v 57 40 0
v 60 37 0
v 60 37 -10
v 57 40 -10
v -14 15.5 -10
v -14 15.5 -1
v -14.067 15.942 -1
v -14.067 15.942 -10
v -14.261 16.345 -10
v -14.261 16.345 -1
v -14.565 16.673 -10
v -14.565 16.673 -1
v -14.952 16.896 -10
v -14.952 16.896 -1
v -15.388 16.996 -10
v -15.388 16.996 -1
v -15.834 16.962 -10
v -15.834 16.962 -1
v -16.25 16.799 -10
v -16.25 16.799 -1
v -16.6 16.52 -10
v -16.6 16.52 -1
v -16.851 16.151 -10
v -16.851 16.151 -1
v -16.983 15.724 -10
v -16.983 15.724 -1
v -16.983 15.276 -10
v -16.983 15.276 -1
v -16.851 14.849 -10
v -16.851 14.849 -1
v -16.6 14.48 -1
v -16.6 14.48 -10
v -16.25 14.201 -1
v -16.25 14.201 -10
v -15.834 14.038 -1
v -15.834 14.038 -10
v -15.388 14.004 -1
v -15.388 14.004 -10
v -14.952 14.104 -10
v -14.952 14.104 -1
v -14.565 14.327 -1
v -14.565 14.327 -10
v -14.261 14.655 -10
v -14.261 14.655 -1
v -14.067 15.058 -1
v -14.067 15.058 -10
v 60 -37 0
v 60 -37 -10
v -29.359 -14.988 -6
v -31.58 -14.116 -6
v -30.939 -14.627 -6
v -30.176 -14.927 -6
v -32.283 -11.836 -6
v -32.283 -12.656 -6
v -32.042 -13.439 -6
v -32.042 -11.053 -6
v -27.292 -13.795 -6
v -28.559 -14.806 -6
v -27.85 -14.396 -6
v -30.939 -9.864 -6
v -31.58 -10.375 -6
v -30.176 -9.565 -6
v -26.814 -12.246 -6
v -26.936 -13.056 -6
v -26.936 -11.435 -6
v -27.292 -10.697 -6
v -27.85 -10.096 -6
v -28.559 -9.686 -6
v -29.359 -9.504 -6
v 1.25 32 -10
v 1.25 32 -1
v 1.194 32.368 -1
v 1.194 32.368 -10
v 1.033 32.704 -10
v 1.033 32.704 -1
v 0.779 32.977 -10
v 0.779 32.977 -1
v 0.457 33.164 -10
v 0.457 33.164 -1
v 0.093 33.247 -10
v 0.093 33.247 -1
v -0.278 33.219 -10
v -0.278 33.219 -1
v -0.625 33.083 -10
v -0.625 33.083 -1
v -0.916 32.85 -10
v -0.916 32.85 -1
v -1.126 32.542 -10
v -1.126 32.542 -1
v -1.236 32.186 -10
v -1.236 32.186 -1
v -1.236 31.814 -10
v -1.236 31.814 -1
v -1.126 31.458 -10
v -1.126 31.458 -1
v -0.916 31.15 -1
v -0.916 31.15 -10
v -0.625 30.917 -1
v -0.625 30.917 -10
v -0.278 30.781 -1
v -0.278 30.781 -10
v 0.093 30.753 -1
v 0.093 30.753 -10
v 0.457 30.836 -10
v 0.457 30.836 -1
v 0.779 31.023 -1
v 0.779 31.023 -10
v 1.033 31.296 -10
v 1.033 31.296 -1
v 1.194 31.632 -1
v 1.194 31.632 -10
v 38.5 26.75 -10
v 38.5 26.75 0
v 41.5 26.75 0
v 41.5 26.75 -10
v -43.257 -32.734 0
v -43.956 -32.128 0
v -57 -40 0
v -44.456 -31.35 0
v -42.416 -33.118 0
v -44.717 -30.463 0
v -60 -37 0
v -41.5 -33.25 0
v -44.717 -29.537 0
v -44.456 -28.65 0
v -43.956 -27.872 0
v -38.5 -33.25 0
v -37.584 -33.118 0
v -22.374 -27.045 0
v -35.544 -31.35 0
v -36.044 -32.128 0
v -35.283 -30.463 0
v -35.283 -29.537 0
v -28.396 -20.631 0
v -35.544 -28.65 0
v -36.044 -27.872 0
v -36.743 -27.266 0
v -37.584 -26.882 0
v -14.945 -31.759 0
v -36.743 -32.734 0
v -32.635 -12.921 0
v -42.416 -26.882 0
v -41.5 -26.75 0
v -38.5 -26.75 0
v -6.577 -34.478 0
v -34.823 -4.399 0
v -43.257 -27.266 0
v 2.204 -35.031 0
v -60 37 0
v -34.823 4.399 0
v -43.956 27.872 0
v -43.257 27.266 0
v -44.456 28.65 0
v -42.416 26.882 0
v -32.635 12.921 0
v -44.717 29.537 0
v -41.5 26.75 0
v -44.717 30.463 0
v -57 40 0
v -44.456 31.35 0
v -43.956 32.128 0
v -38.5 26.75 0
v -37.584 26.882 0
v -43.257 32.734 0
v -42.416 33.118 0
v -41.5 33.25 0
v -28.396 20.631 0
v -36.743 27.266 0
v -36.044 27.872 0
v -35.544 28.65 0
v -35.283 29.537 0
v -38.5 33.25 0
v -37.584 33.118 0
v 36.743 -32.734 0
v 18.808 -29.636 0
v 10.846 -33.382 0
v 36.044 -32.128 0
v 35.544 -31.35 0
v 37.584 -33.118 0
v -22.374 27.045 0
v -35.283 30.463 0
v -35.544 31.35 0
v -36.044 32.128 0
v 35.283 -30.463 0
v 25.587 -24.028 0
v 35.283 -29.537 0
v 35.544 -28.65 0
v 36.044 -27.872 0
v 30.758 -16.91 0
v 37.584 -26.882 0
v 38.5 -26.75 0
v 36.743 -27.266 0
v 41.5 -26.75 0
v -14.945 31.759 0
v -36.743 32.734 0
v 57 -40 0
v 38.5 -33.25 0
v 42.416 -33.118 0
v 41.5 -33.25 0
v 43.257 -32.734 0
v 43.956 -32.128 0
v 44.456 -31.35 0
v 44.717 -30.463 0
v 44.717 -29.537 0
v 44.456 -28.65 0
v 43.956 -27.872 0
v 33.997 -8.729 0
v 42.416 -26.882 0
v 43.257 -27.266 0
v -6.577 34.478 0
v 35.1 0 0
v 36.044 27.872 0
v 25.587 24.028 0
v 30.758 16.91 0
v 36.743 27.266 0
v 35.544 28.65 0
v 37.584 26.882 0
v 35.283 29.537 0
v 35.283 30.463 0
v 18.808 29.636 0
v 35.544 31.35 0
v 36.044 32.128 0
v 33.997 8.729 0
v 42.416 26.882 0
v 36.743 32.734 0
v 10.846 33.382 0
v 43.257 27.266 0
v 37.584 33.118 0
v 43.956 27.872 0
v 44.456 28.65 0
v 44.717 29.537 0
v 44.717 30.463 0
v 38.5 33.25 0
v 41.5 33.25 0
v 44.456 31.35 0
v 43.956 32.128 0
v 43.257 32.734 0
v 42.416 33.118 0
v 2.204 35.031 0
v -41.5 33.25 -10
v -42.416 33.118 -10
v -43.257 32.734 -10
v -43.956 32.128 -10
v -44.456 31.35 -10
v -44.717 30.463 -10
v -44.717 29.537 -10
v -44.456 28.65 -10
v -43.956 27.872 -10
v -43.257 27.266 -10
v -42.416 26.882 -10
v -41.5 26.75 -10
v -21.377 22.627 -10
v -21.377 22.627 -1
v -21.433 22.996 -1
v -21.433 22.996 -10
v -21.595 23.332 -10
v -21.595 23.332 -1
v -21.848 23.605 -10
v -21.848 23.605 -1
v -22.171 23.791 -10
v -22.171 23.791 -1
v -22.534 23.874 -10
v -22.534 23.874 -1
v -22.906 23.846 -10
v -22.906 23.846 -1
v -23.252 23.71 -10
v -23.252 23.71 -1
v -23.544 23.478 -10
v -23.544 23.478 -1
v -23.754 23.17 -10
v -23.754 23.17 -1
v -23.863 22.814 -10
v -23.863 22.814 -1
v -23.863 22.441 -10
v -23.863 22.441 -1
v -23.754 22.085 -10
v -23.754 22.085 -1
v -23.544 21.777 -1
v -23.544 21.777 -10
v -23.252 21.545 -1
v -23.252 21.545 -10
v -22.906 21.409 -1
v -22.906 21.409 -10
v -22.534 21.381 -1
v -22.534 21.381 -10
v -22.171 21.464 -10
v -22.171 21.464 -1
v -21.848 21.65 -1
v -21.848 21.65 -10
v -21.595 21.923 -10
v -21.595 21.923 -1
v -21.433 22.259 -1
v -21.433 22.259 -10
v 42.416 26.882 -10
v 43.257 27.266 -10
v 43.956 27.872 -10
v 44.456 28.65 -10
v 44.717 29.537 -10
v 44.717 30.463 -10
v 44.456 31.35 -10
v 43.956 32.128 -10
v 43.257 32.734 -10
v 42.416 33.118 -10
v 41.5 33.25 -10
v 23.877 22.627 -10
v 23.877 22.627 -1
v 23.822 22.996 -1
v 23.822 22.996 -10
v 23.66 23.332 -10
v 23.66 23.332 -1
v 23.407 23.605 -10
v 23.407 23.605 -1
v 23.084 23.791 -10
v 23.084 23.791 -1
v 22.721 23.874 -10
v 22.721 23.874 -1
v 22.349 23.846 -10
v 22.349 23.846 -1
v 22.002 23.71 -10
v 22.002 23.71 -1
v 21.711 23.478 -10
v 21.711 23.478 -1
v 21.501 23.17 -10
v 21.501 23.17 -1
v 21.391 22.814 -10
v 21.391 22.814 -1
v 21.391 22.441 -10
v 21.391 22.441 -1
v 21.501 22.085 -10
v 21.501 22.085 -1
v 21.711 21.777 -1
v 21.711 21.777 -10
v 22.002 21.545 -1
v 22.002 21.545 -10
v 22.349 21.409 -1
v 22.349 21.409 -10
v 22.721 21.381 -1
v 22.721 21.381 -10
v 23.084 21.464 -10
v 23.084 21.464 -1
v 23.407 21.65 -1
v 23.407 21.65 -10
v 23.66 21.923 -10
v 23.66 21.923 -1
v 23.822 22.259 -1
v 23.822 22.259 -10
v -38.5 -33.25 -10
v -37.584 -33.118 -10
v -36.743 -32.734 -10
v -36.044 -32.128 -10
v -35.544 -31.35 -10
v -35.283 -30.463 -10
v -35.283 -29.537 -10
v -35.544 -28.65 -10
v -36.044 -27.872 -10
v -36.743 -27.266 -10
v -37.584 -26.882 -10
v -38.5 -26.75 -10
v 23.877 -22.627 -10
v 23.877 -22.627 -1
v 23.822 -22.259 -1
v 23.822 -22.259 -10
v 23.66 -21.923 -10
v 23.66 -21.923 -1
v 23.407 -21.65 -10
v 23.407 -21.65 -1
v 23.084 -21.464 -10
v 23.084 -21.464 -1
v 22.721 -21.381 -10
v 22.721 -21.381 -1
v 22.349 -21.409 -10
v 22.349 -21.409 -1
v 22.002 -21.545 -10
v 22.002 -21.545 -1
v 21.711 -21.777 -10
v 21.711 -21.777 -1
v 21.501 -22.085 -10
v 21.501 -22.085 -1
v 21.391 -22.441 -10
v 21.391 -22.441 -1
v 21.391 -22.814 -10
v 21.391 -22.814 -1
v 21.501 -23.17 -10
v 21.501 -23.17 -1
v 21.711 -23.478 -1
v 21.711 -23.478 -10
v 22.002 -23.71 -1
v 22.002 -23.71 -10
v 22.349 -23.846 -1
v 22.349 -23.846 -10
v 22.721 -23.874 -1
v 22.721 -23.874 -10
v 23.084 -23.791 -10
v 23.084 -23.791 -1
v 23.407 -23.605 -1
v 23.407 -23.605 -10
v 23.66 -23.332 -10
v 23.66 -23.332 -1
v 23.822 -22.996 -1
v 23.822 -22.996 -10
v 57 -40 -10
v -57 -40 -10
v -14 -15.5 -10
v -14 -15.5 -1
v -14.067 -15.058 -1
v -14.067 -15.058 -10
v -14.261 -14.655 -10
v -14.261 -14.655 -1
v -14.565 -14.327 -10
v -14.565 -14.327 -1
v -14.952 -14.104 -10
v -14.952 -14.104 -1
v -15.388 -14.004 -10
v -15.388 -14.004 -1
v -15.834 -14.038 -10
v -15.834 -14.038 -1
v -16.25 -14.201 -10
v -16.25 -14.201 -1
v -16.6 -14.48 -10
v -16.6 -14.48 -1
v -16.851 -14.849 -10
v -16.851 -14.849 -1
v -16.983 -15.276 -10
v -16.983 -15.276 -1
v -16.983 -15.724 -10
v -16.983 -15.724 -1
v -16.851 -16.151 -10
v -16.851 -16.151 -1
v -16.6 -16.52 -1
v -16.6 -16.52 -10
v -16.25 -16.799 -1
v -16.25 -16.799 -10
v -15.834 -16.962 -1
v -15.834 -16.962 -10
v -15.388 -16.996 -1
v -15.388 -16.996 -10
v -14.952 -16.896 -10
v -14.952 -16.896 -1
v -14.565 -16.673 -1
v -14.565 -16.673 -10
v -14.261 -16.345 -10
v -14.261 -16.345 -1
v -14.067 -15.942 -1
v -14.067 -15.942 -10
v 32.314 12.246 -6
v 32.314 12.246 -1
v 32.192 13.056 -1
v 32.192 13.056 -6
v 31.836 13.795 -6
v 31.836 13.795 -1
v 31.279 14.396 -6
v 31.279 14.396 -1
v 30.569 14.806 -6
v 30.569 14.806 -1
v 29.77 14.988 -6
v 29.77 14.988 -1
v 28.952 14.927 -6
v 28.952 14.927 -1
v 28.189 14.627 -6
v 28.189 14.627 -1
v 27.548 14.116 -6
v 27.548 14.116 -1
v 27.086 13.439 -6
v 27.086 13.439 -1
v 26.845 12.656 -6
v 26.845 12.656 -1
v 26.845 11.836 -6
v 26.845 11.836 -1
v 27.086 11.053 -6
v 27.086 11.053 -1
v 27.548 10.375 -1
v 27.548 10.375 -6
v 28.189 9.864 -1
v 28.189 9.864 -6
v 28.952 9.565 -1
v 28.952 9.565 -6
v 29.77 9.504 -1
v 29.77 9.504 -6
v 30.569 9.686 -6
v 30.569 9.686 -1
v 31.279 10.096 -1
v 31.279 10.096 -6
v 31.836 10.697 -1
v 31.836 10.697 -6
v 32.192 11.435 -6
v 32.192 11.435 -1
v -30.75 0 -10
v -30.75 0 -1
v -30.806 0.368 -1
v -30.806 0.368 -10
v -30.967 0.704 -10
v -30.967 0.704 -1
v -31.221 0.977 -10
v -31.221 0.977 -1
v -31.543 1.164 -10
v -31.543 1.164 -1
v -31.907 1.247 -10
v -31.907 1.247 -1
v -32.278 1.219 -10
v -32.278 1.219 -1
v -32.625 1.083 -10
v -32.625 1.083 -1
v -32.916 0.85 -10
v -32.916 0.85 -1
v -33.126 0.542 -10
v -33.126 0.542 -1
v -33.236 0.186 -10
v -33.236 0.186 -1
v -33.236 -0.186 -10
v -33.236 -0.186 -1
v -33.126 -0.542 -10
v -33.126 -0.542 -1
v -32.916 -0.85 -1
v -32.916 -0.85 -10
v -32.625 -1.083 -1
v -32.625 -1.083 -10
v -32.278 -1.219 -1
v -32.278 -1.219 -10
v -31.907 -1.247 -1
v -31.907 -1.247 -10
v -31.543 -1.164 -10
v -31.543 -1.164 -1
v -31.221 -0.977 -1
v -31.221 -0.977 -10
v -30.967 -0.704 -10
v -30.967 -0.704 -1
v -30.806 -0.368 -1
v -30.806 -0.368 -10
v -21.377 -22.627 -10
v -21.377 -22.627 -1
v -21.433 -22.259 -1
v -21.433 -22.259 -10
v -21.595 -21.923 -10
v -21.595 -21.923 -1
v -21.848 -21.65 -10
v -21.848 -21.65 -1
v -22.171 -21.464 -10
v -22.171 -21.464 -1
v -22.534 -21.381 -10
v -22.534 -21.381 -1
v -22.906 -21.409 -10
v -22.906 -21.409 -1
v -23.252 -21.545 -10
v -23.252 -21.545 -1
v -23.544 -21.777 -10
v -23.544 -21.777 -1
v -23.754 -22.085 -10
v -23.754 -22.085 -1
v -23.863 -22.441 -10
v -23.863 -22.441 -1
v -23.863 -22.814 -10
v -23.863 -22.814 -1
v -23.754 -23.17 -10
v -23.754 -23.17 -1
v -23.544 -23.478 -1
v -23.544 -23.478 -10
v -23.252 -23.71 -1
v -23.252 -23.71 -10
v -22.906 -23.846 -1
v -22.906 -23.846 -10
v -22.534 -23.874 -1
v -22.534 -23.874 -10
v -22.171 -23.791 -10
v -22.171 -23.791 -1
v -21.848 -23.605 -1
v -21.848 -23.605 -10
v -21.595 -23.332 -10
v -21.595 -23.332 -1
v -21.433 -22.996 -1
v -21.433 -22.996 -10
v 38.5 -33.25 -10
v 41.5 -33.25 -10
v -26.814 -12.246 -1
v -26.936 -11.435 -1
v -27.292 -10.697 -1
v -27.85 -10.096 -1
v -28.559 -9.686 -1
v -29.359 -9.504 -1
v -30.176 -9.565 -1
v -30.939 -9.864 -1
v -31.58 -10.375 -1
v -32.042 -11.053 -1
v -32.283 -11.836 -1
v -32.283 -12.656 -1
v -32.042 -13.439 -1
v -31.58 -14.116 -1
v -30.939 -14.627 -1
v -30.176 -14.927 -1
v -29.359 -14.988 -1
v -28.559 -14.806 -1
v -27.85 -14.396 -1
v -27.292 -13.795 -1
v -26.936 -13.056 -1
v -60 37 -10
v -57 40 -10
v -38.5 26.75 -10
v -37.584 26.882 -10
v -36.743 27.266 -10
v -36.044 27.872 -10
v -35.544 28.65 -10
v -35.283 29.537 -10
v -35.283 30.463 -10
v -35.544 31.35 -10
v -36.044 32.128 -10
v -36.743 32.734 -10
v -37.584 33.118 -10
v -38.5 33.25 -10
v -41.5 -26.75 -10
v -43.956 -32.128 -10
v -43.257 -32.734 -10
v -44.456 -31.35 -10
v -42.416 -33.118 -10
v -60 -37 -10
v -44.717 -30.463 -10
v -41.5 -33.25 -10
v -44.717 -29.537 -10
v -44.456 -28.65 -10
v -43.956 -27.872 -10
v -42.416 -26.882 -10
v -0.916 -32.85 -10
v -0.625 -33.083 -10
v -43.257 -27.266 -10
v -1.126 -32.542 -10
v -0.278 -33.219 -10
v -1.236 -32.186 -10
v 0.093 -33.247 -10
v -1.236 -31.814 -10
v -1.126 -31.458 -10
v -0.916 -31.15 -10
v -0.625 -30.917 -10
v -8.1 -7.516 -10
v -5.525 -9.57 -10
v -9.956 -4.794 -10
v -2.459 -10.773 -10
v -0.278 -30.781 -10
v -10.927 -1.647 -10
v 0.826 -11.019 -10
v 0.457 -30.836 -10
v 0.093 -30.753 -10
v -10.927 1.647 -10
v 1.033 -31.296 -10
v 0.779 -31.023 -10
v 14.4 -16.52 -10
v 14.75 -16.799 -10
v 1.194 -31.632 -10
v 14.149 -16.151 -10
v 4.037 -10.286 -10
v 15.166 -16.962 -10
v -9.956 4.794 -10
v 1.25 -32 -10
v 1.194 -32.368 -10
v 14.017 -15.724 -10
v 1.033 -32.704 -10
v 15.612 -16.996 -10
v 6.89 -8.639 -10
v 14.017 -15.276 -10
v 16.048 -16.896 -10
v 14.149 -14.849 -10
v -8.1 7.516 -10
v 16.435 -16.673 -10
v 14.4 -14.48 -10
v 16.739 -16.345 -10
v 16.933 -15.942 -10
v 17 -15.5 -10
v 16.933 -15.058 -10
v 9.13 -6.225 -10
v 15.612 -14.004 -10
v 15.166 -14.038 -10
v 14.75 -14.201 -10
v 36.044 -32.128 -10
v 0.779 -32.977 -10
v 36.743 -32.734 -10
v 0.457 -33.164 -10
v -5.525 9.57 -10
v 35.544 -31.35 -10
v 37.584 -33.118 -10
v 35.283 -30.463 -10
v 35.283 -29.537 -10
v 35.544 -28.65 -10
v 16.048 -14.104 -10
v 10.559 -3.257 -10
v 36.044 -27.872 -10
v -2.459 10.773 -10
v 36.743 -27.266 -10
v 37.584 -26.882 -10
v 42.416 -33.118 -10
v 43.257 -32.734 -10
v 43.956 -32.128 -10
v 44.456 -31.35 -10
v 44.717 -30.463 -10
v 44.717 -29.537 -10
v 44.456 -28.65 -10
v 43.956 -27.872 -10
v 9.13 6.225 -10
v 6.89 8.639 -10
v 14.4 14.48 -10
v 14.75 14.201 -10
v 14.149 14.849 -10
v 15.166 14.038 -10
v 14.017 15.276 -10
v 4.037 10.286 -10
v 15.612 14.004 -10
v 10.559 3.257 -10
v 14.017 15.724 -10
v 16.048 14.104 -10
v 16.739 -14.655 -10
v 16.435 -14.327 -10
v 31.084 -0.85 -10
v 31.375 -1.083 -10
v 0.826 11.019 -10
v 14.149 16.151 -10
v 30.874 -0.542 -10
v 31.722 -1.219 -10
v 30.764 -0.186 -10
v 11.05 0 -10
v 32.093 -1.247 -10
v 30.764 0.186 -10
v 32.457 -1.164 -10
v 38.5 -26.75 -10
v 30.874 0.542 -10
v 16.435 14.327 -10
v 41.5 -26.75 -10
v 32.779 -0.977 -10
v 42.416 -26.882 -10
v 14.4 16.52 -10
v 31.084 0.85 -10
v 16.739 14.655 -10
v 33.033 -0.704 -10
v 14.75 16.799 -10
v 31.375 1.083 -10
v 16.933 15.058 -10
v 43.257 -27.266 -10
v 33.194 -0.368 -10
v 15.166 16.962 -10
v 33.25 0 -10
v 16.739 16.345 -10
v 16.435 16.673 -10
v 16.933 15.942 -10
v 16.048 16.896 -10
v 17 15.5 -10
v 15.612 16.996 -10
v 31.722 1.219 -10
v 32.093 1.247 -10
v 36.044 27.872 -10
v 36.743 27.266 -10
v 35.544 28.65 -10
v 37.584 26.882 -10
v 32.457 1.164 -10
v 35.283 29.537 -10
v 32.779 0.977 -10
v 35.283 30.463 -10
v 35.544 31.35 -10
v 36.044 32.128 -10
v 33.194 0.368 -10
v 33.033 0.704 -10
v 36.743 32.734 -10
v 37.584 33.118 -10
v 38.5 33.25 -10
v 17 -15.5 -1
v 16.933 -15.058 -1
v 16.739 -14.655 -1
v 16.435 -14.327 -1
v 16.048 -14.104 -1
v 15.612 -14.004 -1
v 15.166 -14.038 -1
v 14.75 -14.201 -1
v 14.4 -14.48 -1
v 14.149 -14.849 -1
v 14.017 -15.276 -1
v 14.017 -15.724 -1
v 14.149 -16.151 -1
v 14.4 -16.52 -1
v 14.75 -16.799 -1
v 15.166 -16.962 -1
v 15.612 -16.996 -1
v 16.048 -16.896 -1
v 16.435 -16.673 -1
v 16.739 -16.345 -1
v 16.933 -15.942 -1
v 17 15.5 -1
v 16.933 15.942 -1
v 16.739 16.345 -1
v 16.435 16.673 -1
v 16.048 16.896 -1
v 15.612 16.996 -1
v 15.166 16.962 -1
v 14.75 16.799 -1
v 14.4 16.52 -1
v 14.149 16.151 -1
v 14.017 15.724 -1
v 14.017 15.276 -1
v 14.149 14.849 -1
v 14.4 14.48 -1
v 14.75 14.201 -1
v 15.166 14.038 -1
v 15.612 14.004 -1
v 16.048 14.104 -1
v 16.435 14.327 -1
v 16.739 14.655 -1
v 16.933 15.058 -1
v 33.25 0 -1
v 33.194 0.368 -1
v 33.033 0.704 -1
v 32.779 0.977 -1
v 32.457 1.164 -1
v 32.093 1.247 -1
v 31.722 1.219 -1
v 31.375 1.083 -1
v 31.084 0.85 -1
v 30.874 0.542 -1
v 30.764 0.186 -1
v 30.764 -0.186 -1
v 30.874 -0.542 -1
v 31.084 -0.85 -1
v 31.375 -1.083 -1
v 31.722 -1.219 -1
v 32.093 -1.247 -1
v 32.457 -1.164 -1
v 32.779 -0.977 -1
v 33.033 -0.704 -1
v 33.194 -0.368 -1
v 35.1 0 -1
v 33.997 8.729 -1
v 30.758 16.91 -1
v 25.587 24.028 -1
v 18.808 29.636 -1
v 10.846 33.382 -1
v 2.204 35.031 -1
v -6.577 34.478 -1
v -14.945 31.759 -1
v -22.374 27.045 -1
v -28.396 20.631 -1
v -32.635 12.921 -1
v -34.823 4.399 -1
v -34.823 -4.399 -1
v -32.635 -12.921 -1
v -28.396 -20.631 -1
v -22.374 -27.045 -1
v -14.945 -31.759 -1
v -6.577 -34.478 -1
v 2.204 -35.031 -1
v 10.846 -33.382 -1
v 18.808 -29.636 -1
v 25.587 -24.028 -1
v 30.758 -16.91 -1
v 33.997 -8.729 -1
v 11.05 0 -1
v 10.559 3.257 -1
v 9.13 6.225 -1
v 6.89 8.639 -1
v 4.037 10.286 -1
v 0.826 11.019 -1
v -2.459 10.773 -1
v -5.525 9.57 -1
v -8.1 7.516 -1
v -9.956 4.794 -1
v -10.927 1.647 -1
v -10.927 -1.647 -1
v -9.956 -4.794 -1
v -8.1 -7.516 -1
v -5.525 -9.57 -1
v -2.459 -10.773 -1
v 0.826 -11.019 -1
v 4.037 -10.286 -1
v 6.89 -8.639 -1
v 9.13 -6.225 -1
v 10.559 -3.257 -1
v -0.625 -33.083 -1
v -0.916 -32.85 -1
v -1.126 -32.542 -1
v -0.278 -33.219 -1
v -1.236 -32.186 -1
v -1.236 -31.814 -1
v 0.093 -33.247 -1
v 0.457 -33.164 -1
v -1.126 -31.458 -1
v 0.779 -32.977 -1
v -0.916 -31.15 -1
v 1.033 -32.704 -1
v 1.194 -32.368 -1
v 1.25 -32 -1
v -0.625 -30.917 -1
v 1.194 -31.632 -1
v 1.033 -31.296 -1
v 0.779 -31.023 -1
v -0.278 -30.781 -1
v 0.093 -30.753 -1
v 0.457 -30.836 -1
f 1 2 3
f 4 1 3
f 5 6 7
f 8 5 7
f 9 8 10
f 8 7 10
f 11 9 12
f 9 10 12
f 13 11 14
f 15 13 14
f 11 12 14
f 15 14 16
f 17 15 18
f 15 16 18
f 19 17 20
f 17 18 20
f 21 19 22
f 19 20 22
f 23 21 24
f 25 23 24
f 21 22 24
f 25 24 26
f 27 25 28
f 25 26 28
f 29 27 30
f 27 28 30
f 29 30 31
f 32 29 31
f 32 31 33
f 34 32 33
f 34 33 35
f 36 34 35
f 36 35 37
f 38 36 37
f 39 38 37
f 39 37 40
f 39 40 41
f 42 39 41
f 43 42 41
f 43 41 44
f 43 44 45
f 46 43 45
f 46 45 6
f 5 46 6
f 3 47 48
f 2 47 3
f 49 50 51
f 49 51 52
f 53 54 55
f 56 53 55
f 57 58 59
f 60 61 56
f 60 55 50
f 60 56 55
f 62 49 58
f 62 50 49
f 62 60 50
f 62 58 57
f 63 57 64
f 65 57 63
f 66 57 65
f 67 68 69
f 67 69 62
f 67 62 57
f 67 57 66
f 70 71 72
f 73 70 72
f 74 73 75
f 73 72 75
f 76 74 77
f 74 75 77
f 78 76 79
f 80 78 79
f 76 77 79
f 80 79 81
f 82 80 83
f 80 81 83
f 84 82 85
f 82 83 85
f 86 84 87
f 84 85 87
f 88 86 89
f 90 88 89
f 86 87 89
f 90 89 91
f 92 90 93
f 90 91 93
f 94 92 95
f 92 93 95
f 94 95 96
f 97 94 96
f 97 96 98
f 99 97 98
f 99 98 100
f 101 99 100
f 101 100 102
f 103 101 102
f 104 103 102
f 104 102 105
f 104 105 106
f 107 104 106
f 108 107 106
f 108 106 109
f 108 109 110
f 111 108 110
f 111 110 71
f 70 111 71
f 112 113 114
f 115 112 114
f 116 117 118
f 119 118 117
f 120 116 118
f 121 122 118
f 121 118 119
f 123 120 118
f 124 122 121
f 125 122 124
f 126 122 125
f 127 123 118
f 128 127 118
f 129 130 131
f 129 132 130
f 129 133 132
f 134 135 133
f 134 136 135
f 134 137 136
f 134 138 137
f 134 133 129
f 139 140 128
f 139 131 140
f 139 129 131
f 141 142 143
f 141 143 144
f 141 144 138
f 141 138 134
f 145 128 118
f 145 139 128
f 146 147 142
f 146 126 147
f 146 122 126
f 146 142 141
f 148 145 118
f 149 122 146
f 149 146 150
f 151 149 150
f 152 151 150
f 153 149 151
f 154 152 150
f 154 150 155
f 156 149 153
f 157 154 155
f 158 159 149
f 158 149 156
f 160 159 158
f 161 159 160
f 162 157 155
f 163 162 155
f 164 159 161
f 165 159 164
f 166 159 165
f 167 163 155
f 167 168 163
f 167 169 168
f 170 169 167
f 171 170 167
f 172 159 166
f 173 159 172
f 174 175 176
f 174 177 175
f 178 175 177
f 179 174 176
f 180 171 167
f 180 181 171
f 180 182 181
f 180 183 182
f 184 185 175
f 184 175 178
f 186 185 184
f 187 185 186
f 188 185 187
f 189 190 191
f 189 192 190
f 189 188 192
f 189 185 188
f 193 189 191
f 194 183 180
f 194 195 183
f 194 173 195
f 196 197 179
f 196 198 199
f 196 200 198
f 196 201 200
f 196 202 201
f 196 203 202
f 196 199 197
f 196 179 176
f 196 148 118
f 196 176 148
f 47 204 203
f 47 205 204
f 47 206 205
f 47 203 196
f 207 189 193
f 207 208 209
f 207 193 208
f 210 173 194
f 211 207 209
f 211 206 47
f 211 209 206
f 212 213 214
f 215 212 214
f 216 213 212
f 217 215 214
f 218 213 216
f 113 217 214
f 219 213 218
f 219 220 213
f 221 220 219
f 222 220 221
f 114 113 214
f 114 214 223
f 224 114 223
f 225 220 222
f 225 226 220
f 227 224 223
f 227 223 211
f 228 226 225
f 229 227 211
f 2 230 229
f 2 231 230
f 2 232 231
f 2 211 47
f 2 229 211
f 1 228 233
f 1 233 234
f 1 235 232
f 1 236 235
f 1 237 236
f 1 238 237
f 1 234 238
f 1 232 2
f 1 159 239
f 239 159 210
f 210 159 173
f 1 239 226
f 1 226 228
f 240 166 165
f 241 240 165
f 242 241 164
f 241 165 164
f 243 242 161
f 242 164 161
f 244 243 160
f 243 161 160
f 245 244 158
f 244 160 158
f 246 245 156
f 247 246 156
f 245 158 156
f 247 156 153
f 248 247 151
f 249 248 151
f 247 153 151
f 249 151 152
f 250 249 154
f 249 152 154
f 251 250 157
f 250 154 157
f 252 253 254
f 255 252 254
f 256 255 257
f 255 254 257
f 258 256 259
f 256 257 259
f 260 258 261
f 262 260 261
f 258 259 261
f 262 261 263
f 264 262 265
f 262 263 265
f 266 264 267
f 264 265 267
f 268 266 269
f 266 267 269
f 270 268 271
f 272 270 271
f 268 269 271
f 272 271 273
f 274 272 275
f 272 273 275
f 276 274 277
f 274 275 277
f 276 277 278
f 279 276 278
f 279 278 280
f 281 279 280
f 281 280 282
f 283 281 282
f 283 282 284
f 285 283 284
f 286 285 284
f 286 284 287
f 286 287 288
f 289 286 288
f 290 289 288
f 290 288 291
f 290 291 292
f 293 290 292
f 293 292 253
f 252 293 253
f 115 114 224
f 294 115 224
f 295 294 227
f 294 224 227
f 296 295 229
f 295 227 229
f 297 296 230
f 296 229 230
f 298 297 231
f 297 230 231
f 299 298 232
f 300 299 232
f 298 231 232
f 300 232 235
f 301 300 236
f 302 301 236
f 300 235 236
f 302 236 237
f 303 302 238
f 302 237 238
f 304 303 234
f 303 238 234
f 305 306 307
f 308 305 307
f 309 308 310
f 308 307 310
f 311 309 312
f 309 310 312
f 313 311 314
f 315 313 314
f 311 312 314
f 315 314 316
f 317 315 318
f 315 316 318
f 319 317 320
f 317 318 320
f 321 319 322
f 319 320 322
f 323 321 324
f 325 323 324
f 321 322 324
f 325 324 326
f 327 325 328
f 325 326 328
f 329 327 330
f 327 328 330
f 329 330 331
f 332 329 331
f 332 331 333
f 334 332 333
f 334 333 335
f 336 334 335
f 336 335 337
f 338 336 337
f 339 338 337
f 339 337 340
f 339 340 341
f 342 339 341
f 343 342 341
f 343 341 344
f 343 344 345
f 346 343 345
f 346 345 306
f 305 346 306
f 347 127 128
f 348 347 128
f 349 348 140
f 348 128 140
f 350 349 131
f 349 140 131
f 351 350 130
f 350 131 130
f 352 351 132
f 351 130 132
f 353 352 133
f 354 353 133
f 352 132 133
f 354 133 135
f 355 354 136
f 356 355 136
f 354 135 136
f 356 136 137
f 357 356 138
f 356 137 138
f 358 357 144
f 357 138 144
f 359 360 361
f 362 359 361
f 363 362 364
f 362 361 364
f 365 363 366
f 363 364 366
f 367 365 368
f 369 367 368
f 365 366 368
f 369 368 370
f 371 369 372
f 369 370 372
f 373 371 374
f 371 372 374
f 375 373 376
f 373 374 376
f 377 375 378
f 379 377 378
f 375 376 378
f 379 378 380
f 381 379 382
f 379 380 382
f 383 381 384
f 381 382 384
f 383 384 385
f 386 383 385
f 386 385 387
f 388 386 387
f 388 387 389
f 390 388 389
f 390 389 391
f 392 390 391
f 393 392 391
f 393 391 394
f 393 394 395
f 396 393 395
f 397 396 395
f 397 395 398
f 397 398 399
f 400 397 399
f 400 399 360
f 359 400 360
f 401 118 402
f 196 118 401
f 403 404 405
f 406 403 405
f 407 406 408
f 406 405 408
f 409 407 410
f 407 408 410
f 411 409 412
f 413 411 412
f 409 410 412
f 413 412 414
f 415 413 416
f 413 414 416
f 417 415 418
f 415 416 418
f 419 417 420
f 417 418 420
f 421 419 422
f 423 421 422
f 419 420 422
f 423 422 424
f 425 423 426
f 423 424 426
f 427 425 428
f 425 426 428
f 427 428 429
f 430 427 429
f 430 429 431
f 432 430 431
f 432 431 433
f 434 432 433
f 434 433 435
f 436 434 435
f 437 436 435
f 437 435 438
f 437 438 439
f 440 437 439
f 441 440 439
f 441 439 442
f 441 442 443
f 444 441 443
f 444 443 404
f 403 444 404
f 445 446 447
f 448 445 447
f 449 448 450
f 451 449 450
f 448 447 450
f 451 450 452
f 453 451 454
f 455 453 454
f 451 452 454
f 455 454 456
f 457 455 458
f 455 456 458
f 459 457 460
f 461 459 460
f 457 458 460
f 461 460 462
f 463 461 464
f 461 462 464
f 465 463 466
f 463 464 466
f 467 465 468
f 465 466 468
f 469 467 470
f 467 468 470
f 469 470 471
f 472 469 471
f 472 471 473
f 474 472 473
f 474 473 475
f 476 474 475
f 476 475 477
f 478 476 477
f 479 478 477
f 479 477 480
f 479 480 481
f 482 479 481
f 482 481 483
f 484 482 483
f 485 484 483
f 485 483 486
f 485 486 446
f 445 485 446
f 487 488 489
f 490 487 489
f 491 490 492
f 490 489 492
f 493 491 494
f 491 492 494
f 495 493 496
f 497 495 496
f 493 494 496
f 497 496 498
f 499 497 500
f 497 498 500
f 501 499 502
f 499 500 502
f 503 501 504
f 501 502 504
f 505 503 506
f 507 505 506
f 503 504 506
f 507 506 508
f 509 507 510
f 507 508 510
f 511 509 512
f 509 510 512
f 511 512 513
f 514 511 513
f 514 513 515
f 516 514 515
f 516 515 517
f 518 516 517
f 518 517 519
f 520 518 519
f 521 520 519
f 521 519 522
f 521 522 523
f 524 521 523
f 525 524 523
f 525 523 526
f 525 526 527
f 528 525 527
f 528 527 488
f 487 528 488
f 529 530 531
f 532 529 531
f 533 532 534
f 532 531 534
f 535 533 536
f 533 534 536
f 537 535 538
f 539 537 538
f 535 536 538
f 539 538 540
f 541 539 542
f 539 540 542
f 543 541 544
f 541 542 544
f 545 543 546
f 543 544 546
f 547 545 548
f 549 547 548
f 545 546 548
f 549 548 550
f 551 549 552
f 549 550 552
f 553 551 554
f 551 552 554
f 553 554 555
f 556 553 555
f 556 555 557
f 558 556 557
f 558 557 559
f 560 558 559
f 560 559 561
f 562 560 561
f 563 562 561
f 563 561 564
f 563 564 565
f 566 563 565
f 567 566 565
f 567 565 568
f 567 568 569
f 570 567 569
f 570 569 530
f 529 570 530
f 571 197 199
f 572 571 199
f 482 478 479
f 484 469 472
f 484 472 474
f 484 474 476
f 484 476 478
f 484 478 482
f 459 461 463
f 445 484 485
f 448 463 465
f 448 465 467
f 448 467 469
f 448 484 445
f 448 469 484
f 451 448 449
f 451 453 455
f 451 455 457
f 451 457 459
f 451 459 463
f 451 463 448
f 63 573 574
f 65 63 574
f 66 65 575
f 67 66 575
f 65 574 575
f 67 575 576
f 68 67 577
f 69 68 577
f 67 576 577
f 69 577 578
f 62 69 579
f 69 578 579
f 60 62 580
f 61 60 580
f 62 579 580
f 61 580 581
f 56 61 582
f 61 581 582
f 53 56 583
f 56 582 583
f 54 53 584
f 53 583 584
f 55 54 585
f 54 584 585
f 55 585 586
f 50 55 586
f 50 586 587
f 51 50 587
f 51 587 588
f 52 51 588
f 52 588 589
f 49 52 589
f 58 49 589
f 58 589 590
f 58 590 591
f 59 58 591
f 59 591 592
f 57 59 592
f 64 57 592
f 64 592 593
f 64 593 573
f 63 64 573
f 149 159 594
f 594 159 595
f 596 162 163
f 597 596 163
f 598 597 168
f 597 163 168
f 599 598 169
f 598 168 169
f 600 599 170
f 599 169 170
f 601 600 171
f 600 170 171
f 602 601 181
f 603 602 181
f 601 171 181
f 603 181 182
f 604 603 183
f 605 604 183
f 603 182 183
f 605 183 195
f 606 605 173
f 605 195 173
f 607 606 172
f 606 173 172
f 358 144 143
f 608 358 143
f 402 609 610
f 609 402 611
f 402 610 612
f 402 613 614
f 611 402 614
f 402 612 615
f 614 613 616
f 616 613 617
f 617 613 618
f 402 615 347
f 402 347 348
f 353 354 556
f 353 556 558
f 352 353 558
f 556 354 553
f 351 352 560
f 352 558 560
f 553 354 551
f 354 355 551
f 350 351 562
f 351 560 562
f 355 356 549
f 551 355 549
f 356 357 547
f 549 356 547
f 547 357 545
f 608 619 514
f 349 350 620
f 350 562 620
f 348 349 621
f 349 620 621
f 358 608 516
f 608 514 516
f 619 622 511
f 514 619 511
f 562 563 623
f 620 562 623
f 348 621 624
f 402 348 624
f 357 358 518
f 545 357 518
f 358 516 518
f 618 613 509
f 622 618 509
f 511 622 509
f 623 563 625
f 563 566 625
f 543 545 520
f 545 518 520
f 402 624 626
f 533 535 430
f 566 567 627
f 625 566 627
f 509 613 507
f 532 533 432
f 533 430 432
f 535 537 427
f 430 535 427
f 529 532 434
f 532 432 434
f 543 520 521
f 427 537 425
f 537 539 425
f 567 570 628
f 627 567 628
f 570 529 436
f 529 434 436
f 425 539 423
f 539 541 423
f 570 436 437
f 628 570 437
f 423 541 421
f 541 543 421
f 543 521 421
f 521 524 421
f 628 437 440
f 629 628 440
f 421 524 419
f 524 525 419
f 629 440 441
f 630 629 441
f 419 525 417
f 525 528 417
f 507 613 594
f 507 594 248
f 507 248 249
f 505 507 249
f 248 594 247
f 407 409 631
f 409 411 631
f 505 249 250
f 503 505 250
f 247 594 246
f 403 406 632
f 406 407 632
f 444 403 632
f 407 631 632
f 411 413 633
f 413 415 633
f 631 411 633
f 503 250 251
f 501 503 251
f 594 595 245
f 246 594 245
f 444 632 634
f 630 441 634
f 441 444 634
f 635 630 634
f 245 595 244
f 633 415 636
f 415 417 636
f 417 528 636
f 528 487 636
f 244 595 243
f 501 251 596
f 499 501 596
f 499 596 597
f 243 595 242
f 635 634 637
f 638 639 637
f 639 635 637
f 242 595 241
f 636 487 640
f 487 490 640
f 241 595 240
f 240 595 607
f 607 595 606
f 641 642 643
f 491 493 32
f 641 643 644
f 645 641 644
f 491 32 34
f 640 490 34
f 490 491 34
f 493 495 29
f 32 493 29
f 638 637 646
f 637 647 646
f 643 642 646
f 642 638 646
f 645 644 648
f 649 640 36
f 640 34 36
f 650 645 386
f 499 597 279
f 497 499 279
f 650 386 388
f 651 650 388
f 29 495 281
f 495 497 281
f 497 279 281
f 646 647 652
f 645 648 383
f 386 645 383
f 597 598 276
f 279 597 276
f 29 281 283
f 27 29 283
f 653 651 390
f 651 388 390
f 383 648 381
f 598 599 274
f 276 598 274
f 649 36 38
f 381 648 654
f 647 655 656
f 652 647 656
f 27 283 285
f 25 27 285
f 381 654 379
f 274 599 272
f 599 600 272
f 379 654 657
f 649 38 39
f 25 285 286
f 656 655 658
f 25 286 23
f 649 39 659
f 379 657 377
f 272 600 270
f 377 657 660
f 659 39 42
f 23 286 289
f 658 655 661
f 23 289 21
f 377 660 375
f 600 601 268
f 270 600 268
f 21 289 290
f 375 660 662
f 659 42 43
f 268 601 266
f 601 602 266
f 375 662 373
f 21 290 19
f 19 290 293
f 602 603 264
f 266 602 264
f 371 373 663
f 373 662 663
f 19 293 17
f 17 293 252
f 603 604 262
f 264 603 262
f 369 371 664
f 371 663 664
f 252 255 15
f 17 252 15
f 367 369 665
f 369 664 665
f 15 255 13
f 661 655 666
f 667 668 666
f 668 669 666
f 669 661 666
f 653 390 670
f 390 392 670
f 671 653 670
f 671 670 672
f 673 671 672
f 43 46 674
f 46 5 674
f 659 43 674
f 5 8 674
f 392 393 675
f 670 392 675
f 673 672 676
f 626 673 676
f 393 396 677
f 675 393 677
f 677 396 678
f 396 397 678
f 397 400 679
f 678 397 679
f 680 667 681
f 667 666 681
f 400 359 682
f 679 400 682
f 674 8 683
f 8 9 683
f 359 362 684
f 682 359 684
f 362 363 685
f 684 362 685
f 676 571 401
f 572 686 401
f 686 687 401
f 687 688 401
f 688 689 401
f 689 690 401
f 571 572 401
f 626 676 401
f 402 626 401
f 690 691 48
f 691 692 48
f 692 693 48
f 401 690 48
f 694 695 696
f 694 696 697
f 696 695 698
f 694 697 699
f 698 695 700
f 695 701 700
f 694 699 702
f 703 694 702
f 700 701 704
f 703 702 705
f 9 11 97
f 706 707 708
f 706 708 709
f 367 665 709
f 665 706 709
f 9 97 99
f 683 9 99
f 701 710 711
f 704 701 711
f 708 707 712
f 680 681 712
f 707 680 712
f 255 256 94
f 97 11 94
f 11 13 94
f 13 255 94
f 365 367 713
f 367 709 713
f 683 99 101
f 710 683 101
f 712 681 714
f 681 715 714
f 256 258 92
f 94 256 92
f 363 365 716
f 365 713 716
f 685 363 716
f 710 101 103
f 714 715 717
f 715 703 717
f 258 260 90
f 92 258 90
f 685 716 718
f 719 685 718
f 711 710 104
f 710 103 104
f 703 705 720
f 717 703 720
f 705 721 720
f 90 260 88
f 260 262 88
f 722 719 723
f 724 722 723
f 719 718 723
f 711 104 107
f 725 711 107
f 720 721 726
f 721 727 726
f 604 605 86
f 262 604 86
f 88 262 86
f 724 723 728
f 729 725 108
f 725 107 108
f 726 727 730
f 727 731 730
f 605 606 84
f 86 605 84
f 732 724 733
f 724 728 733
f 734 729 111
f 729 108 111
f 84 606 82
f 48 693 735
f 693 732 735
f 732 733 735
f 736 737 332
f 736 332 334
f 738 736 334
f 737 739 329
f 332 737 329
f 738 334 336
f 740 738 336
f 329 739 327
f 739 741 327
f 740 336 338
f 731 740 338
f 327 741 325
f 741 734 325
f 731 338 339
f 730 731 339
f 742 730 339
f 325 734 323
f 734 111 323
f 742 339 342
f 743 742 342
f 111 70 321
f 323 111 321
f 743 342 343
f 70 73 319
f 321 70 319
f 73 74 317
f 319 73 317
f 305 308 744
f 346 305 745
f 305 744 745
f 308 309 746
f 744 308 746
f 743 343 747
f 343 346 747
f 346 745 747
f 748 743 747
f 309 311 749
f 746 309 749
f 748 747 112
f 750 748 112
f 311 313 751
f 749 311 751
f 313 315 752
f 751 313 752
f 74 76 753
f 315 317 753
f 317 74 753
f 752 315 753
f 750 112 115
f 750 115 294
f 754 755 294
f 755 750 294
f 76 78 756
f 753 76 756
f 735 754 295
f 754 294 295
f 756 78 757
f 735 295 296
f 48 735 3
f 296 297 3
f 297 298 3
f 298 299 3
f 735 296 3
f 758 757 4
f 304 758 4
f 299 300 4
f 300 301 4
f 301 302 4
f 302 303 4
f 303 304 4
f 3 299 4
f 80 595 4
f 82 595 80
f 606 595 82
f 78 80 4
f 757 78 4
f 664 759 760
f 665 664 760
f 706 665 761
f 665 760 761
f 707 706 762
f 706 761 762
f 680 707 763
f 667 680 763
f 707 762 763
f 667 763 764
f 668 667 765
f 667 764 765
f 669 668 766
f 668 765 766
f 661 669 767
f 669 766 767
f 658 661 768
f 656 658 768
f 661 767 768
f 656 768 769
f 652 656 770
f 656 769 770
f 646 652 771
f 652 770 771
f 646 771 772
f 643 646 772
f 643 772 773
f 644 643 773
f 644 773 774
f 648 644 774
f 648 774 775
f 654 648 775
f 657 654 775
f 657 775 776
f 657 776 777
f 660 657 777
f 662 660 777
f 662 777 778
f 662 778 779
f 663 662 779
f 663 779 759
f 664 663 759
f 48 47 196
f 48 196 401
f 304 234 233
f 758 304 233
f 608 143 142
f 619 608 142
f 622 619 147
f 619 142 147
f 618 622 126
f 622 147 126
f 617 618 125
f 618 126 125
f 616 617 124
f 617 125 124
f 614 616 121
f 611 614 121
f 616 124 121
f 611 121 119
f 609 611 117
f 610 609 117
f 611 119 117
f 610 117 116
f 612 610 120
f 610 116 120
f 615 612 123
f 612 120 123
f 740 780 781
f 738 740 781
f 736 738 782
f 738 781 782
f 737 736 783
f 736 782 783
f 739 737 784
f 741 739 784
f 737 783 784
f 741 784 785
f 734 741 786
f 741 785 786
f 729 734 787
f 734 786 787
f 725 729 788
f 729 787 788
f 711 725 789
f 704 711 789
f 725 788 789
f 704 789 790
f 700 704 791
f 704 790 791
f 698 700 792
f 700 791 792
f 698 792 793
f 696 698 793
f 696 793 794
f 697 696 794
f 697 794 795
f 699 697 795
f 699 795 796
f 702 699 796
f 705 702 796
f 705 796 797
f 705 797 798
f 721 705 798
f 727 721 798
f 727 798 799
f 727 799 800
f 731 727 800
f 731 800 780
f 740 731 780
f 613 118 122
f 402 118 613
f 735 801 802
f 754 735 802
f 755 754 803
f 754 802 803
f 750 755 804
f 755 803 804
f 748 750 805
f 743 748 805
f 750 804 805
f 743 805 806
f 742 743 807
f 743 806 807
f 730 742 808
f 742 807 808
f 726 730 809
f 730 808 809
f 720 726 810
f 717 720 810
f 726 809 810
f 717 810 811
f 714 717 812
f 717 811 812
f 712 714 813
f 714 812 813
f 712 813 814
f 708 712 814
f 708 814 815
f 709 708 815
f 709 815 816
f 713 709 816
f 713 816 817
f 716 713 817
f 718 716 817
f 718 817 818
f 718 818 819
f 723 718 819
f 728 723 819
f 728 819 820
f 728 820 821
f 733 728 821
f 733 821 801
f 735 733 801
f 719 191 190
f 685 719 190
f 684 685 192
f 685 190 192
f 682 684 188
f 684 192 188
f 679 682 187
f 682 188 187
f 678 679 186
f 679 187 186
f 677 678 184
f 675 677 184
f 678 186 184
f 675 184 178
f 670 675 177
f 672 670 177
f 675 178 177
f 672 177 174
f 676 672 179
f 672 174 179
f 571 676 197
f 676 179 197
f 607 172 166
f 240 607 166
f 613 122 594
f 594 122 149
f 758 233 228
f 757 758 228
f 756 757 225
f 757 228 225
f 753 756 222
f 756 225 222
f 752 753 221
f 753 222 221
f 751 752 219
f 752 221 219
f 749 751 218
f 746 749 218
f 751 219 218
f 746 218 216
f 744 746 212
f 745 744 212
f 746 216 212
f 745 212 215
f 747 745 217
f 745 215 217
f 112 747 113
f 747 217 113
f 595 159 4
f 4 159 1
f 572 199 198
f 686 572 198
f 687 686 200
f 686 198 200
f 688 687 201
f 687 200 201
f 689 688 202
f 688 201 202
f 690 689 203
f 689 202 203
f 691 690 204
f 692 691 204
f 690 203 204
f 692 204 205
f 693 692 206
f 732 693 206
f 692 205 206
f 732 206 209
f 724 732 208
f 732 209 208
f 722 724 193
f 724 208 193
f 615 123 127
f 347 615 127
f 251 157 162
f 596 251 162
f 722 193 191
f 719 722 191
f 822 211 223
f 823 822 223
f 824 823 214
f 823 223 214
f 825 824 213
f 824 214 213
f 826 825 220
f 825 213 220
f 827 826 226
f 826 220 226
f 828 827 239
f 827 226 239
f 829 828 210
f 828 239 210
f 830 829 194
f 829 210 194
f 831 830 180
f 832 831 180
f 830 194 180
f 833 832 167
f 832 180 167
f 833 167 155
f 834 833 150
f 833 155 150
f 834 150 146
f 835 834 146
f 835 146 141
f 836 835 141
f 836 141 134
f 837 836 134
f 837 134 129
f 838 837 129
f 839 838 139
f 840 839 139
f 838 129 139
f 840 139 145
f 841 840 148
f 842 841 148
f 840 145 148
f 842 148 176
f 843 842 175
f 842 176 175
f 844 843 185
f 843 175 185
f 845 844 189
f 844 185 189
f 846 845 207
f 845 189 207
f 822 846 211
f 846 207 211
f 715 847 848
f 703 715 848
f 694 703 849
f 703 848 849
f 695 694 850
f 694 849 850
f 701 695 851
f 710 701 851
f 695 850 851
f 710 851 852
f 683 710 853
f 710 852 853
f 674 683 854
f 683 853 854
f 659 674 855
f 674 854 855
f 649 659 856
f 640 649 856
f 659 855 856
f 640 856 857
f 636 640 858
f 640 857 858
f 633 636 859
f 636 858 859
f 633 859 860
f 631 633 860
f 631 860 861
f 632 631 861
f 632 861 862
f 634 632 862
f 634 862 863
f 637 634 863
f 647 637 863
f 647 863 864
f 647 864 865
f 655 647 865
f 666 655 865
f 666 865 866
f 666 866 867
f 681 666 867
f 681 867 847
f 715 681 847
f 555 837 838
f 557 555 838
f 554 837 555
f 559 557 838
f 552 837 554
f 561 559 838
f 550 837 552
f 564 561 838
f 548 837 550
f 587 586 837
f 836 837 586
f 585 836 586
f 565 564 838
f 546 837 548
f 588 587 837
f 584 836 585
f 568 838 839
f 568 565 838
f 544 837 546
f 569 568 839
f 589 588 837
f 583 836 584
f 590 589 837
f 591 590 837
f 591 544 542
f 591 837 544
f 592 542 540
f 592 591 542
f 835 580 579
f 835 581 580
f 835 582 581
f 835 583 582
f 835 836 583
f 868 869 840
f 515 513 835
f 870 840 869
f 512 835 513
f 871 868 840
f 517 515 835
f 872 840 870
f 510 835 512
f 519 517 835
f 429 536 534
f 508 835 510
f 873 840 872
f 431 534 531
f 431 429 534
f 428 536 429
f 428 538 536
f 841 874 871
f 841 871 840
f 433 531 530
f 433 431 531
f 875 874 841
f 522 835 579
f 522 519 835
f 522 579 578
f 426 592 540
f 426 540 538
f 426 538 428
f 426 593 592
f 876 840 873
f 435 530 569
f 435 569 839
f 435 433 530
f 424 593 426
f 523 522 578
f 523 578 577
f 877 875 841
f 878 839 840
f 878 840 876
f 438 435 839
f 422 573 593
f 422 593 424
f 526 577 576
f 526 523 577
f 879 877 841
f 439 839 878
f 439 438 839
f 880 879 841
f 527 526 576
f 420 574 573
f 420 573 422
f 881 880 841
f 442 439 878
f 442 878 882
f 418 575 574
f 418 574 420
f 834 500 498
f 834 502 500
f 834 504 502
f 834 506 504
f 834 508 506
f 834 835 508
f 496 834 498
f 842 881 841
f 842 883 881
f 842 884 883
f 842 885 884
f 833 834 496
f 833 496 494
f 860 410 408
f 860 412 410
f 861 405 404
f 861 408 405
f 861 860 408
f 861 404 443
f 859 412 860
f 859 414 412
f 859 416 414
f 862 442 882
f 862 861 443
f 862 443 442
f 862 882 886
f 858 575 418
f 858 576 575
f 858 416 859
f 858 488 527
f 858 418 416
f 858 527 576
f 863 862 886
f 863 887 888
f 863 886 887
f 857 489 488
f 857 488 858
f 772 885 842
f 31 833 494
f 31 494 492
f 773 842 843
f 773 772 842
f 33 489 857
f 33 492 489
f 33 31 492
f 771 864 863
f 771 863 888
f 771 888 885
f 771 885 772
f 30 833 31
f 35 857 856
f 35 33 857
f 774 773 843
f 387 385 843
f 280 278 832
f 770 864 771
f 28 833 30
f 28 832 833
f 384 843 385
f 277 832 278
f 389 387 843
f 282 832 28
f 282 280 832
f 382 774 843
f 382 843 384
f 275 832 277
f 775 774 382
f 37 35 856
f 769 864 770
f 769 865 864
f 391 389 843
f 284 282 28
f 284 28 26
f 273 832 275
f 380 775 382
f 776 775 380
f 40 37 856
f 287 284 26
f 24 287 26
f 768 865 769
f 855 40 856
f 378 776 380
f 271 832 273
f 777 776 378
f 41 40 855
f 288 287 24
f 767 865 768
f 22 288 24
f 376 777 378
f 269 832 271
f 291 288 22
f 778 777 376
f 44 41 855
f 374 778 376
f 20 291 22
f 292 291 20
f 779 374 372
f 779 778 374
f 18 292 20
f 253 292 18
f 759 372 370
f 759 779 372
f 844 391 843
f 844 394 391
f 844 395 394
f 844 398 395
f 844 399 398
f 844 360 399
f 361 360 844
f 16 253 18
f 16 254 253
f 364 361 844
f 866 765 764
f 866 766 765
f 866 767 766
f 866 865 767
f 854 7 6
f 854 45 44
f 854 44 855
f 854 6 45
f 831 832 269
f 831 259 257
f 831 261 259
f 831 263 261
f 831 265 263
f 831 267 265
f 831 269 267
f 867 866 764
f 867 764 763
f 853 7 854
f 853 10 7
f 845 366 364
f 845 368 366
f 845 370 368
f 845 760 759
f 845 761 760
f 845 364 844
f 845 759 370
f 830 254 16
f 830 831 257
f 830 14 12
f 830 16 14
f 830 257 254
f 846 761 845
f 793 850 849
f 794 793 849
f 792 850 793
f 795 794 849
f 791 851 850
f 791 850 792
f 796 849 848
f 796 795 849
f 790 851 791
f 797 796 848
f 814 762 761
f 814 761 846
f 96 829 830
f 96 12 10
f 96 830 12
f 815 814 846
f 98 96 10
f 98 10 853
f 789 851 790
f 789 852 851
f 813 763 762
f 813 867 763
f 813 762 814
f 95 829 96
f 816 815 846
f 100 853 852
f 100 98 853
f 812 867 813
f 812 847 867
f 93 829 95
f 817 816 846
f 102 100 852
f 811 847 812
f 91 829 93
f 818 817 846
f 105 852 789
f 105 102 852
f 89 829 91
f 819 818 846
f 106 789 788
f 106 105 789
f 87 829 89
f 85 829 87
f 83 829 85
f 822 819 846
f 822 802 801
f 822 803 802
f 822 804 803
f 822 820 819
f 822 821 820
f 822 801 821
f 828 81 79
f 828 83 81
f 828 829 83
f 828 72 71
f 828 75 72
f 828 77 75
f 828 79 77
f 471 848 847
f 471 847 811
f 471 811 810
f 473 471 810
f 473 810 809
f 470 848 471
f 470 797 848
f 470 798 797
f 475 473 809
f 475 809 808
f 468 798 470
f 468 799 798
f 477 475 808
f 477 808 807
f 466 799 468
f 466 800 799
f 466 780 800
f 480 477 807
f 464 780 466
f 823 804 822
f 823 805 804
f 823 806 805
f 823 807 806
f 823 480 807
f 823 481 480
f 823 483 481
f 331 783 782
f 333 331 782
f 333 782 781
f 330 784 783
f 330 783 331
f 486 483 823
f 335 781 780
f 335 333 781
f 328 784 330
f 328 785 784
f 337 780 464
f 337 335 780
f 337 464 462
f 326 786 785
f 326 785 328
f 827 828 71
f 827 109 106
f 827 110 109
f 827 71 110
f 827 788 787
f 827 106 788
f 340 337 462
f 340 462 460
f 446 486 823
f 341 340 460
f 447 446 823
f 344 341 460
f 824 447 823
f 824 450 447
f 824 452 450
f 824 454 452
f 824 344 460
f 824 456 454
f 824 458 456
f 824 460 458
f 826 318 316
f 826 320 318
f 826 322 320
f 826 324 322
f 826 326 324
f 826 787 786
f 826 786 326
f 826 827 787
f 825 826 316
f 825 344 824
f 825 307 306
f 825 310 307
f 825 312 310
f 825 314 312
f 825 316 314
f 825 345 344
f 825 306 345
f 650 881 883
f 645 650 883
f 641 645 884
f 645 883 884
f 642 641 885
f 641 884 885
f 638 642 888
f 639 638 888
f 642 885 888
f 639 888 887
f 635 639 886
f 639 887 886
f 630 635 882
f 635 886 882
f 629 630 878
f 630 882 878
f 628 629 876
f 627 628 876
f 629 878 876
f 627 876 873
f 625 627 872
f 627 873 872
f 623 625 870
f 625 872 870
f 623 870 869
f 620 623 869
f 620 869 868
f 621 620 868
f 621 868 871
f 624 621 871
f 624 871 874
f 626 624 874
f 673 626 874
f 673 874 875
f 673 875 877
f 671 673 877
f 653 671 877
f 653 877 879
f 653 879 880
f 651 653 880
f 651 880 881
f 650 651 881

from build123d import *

# Parameters (mm, degrees)
SKETCH003_W     = 120
SKETCH003_H     = 80
PAD_DEPTH       = 10
SKETCH004_R     = 1.25
POCKET_DEPTH    = 10.001
SKETCH006_R     = 11.05
POCKET002_DEPTH = 10.001
CHAMFER_SIZE    = 3
SKETCH010_R     = 11.015
SKETCH010_R_2   = 1.5
POCKET006_DEPTH = 10.001
SKETCH011_R     = 2.75
POCKET007_DEPTH = 6
SKETCH012_R     = 35.1
POCKET008_DEPTH = 1
POCKET009_DEPTH = 10.001


with BuildPart() as part:
    # Sketch003 → Pad (new body)
    with BuildSketch(Plane.XY):
        Rectangle(SKETCH003_W, SKETCH003_H)
    extrude(amount=-PAD_DEPTH)

    # Sketch004 (on Face5 of Pad) → Pocket (cut, through all)
    with BuildSketch(Plane.XY):
        with Locations((-22.627417, 22.627417)):
            Circle(SKETCH004_R)
        with Locations((0, 32)):
            Circle(SKETCH004_R)
        with Locations((22.627417, 22.627417)):
            Circle(SKETCH004_R)
        with Locations((32, 0)):
            Circle(SKETCH004_R)
        with Locations((22.627417, -22.627417)):
            Circle(SKETCH004_R)
        with Locations((0, -32)):
            Circle(SKETCH004_R)
        with Locations((-22.627417, -22.627417)):
            Circle(SKETCH004_R)
        with Locations((-32, 0)):
            Circle(SKETCH004_R)
    extrude(amount=-POCKET_DEPTH, mode=Mode.SUBTRACT)

    # Sketch006 → Pocket002 (cut, through all)
    with BuildSketch(Plane.XY):
        Circle(SKETCH006_R)
    extrude(amount=-POCKET002_DEPTH, mode=Mode.SUBTRACT)

    # Chamfer
    chamfer_edges = [part.edges().sort_by_distance(p)[0] for p in [
        (60, -40, -5),
        (60, 40, -5),
        (-60, 40, -5),
        (-60, -40, -5),
    ]]
    chamfer(chamfer_edges, length=CHAMFER_SIZE)

    # Sketch010 (on Face5 of Pad) → Pocket006 (cut, through all)
    with BuildSketch(Plane.XY):
        Circle(SKETCH010_R)
        with Locations((-15.5, 15.5)):
            Circle(SKETCH010_R_2)
        with Locations((15.5, 15.5)):
            Circle(SKETCH010_R_2)
        with Locations((15.5, -15.5)):
            Circle(SKETCH010_R_2)
        with Locations((-15.5, -15.5)):
            Circle(SKETCH010_R_2)
    extrude(amount=-POCKET006_DEPTH, mode=Mode.SUBTRACT)

    # Sketch011 (on Face4 of Pocket) → Pocket007 (cut)
    with BuildSketch(Plane.XY):
        with Locations((-29.564145, -12.24587)):
            Circle(SKETCH011_R)
        with Locations((29.564145, 12.24587)):
            Circle(SKETCH011_R)
    extrude(amount=-POCKET007_DEPTH, mode=Mode.SUBTRACT)

    # Sketch012 (on Face4 of Pocket002) → Pocket008 (cut)
    with BuildSketch(Plane.XY):
        Circle(SKETCH012_R)
    extrude(amount=-POCKET008_DEPTH, mode=Mode.SUBTRACT)

    # Sketch013 (on Face2 of Pocket008) → Pocket009 (cut, through all)
    with BuildSketch(Plane.XY):
        with BuildLine():
            ThreePointArc((-41.5, 33.25), (-44.75, 30), (-41.5, 26.75))
            Line((-41.5, 26.75), (-38.5, 26.75))
            ThreePointArc((-38.5, 26.75), (-35.25, 30), (-38.5, 33.25))
            Line((-38.5, 33.25), (-41.5, 33.25))
        make_face()
        with BuildLine():
            ThreePointArc((38.5, 33.25), (35.25, 30), (38.5, 26.75))
            Line((38.5, 26.75), (41.5, 26.75))
            ThreePointArc((41.5, 26.75), (44.75, 30), (41.5, 33.25))
            Line((41.5, 33.25), (38.5, 33.25))
        make_face()
        with BuildLine():
            ThreePointArc((-41.5, -26.75), (-44.75, -30), (-41.5, -33.25))
            Line((-41.5, -33.25), (-38.5, -33.25))
            ThreePointArc((-38.5, -33.25), (-35.25, -30), (-38.5, -26.75))
            Line((-38.5, -26.75), (-41.5, -26.75))
        make_face()
        with BuildLine():
            ThreePointArc((38.5, -26.75), (35.25, -30), (38.5, -33.25))
            Line((38.5, -33.25), (41.5, -33.25))
            ThreePointArc((41.5, -33.25), (44.75, -30), (41.5, -26.75))
            Line((41.5, -26.75), (38.5, -26.75))
        make_face()
    extrude(amount=-POCKET009_DEPTH, mode=Mode.SUBTRACT)


solid = part.part
